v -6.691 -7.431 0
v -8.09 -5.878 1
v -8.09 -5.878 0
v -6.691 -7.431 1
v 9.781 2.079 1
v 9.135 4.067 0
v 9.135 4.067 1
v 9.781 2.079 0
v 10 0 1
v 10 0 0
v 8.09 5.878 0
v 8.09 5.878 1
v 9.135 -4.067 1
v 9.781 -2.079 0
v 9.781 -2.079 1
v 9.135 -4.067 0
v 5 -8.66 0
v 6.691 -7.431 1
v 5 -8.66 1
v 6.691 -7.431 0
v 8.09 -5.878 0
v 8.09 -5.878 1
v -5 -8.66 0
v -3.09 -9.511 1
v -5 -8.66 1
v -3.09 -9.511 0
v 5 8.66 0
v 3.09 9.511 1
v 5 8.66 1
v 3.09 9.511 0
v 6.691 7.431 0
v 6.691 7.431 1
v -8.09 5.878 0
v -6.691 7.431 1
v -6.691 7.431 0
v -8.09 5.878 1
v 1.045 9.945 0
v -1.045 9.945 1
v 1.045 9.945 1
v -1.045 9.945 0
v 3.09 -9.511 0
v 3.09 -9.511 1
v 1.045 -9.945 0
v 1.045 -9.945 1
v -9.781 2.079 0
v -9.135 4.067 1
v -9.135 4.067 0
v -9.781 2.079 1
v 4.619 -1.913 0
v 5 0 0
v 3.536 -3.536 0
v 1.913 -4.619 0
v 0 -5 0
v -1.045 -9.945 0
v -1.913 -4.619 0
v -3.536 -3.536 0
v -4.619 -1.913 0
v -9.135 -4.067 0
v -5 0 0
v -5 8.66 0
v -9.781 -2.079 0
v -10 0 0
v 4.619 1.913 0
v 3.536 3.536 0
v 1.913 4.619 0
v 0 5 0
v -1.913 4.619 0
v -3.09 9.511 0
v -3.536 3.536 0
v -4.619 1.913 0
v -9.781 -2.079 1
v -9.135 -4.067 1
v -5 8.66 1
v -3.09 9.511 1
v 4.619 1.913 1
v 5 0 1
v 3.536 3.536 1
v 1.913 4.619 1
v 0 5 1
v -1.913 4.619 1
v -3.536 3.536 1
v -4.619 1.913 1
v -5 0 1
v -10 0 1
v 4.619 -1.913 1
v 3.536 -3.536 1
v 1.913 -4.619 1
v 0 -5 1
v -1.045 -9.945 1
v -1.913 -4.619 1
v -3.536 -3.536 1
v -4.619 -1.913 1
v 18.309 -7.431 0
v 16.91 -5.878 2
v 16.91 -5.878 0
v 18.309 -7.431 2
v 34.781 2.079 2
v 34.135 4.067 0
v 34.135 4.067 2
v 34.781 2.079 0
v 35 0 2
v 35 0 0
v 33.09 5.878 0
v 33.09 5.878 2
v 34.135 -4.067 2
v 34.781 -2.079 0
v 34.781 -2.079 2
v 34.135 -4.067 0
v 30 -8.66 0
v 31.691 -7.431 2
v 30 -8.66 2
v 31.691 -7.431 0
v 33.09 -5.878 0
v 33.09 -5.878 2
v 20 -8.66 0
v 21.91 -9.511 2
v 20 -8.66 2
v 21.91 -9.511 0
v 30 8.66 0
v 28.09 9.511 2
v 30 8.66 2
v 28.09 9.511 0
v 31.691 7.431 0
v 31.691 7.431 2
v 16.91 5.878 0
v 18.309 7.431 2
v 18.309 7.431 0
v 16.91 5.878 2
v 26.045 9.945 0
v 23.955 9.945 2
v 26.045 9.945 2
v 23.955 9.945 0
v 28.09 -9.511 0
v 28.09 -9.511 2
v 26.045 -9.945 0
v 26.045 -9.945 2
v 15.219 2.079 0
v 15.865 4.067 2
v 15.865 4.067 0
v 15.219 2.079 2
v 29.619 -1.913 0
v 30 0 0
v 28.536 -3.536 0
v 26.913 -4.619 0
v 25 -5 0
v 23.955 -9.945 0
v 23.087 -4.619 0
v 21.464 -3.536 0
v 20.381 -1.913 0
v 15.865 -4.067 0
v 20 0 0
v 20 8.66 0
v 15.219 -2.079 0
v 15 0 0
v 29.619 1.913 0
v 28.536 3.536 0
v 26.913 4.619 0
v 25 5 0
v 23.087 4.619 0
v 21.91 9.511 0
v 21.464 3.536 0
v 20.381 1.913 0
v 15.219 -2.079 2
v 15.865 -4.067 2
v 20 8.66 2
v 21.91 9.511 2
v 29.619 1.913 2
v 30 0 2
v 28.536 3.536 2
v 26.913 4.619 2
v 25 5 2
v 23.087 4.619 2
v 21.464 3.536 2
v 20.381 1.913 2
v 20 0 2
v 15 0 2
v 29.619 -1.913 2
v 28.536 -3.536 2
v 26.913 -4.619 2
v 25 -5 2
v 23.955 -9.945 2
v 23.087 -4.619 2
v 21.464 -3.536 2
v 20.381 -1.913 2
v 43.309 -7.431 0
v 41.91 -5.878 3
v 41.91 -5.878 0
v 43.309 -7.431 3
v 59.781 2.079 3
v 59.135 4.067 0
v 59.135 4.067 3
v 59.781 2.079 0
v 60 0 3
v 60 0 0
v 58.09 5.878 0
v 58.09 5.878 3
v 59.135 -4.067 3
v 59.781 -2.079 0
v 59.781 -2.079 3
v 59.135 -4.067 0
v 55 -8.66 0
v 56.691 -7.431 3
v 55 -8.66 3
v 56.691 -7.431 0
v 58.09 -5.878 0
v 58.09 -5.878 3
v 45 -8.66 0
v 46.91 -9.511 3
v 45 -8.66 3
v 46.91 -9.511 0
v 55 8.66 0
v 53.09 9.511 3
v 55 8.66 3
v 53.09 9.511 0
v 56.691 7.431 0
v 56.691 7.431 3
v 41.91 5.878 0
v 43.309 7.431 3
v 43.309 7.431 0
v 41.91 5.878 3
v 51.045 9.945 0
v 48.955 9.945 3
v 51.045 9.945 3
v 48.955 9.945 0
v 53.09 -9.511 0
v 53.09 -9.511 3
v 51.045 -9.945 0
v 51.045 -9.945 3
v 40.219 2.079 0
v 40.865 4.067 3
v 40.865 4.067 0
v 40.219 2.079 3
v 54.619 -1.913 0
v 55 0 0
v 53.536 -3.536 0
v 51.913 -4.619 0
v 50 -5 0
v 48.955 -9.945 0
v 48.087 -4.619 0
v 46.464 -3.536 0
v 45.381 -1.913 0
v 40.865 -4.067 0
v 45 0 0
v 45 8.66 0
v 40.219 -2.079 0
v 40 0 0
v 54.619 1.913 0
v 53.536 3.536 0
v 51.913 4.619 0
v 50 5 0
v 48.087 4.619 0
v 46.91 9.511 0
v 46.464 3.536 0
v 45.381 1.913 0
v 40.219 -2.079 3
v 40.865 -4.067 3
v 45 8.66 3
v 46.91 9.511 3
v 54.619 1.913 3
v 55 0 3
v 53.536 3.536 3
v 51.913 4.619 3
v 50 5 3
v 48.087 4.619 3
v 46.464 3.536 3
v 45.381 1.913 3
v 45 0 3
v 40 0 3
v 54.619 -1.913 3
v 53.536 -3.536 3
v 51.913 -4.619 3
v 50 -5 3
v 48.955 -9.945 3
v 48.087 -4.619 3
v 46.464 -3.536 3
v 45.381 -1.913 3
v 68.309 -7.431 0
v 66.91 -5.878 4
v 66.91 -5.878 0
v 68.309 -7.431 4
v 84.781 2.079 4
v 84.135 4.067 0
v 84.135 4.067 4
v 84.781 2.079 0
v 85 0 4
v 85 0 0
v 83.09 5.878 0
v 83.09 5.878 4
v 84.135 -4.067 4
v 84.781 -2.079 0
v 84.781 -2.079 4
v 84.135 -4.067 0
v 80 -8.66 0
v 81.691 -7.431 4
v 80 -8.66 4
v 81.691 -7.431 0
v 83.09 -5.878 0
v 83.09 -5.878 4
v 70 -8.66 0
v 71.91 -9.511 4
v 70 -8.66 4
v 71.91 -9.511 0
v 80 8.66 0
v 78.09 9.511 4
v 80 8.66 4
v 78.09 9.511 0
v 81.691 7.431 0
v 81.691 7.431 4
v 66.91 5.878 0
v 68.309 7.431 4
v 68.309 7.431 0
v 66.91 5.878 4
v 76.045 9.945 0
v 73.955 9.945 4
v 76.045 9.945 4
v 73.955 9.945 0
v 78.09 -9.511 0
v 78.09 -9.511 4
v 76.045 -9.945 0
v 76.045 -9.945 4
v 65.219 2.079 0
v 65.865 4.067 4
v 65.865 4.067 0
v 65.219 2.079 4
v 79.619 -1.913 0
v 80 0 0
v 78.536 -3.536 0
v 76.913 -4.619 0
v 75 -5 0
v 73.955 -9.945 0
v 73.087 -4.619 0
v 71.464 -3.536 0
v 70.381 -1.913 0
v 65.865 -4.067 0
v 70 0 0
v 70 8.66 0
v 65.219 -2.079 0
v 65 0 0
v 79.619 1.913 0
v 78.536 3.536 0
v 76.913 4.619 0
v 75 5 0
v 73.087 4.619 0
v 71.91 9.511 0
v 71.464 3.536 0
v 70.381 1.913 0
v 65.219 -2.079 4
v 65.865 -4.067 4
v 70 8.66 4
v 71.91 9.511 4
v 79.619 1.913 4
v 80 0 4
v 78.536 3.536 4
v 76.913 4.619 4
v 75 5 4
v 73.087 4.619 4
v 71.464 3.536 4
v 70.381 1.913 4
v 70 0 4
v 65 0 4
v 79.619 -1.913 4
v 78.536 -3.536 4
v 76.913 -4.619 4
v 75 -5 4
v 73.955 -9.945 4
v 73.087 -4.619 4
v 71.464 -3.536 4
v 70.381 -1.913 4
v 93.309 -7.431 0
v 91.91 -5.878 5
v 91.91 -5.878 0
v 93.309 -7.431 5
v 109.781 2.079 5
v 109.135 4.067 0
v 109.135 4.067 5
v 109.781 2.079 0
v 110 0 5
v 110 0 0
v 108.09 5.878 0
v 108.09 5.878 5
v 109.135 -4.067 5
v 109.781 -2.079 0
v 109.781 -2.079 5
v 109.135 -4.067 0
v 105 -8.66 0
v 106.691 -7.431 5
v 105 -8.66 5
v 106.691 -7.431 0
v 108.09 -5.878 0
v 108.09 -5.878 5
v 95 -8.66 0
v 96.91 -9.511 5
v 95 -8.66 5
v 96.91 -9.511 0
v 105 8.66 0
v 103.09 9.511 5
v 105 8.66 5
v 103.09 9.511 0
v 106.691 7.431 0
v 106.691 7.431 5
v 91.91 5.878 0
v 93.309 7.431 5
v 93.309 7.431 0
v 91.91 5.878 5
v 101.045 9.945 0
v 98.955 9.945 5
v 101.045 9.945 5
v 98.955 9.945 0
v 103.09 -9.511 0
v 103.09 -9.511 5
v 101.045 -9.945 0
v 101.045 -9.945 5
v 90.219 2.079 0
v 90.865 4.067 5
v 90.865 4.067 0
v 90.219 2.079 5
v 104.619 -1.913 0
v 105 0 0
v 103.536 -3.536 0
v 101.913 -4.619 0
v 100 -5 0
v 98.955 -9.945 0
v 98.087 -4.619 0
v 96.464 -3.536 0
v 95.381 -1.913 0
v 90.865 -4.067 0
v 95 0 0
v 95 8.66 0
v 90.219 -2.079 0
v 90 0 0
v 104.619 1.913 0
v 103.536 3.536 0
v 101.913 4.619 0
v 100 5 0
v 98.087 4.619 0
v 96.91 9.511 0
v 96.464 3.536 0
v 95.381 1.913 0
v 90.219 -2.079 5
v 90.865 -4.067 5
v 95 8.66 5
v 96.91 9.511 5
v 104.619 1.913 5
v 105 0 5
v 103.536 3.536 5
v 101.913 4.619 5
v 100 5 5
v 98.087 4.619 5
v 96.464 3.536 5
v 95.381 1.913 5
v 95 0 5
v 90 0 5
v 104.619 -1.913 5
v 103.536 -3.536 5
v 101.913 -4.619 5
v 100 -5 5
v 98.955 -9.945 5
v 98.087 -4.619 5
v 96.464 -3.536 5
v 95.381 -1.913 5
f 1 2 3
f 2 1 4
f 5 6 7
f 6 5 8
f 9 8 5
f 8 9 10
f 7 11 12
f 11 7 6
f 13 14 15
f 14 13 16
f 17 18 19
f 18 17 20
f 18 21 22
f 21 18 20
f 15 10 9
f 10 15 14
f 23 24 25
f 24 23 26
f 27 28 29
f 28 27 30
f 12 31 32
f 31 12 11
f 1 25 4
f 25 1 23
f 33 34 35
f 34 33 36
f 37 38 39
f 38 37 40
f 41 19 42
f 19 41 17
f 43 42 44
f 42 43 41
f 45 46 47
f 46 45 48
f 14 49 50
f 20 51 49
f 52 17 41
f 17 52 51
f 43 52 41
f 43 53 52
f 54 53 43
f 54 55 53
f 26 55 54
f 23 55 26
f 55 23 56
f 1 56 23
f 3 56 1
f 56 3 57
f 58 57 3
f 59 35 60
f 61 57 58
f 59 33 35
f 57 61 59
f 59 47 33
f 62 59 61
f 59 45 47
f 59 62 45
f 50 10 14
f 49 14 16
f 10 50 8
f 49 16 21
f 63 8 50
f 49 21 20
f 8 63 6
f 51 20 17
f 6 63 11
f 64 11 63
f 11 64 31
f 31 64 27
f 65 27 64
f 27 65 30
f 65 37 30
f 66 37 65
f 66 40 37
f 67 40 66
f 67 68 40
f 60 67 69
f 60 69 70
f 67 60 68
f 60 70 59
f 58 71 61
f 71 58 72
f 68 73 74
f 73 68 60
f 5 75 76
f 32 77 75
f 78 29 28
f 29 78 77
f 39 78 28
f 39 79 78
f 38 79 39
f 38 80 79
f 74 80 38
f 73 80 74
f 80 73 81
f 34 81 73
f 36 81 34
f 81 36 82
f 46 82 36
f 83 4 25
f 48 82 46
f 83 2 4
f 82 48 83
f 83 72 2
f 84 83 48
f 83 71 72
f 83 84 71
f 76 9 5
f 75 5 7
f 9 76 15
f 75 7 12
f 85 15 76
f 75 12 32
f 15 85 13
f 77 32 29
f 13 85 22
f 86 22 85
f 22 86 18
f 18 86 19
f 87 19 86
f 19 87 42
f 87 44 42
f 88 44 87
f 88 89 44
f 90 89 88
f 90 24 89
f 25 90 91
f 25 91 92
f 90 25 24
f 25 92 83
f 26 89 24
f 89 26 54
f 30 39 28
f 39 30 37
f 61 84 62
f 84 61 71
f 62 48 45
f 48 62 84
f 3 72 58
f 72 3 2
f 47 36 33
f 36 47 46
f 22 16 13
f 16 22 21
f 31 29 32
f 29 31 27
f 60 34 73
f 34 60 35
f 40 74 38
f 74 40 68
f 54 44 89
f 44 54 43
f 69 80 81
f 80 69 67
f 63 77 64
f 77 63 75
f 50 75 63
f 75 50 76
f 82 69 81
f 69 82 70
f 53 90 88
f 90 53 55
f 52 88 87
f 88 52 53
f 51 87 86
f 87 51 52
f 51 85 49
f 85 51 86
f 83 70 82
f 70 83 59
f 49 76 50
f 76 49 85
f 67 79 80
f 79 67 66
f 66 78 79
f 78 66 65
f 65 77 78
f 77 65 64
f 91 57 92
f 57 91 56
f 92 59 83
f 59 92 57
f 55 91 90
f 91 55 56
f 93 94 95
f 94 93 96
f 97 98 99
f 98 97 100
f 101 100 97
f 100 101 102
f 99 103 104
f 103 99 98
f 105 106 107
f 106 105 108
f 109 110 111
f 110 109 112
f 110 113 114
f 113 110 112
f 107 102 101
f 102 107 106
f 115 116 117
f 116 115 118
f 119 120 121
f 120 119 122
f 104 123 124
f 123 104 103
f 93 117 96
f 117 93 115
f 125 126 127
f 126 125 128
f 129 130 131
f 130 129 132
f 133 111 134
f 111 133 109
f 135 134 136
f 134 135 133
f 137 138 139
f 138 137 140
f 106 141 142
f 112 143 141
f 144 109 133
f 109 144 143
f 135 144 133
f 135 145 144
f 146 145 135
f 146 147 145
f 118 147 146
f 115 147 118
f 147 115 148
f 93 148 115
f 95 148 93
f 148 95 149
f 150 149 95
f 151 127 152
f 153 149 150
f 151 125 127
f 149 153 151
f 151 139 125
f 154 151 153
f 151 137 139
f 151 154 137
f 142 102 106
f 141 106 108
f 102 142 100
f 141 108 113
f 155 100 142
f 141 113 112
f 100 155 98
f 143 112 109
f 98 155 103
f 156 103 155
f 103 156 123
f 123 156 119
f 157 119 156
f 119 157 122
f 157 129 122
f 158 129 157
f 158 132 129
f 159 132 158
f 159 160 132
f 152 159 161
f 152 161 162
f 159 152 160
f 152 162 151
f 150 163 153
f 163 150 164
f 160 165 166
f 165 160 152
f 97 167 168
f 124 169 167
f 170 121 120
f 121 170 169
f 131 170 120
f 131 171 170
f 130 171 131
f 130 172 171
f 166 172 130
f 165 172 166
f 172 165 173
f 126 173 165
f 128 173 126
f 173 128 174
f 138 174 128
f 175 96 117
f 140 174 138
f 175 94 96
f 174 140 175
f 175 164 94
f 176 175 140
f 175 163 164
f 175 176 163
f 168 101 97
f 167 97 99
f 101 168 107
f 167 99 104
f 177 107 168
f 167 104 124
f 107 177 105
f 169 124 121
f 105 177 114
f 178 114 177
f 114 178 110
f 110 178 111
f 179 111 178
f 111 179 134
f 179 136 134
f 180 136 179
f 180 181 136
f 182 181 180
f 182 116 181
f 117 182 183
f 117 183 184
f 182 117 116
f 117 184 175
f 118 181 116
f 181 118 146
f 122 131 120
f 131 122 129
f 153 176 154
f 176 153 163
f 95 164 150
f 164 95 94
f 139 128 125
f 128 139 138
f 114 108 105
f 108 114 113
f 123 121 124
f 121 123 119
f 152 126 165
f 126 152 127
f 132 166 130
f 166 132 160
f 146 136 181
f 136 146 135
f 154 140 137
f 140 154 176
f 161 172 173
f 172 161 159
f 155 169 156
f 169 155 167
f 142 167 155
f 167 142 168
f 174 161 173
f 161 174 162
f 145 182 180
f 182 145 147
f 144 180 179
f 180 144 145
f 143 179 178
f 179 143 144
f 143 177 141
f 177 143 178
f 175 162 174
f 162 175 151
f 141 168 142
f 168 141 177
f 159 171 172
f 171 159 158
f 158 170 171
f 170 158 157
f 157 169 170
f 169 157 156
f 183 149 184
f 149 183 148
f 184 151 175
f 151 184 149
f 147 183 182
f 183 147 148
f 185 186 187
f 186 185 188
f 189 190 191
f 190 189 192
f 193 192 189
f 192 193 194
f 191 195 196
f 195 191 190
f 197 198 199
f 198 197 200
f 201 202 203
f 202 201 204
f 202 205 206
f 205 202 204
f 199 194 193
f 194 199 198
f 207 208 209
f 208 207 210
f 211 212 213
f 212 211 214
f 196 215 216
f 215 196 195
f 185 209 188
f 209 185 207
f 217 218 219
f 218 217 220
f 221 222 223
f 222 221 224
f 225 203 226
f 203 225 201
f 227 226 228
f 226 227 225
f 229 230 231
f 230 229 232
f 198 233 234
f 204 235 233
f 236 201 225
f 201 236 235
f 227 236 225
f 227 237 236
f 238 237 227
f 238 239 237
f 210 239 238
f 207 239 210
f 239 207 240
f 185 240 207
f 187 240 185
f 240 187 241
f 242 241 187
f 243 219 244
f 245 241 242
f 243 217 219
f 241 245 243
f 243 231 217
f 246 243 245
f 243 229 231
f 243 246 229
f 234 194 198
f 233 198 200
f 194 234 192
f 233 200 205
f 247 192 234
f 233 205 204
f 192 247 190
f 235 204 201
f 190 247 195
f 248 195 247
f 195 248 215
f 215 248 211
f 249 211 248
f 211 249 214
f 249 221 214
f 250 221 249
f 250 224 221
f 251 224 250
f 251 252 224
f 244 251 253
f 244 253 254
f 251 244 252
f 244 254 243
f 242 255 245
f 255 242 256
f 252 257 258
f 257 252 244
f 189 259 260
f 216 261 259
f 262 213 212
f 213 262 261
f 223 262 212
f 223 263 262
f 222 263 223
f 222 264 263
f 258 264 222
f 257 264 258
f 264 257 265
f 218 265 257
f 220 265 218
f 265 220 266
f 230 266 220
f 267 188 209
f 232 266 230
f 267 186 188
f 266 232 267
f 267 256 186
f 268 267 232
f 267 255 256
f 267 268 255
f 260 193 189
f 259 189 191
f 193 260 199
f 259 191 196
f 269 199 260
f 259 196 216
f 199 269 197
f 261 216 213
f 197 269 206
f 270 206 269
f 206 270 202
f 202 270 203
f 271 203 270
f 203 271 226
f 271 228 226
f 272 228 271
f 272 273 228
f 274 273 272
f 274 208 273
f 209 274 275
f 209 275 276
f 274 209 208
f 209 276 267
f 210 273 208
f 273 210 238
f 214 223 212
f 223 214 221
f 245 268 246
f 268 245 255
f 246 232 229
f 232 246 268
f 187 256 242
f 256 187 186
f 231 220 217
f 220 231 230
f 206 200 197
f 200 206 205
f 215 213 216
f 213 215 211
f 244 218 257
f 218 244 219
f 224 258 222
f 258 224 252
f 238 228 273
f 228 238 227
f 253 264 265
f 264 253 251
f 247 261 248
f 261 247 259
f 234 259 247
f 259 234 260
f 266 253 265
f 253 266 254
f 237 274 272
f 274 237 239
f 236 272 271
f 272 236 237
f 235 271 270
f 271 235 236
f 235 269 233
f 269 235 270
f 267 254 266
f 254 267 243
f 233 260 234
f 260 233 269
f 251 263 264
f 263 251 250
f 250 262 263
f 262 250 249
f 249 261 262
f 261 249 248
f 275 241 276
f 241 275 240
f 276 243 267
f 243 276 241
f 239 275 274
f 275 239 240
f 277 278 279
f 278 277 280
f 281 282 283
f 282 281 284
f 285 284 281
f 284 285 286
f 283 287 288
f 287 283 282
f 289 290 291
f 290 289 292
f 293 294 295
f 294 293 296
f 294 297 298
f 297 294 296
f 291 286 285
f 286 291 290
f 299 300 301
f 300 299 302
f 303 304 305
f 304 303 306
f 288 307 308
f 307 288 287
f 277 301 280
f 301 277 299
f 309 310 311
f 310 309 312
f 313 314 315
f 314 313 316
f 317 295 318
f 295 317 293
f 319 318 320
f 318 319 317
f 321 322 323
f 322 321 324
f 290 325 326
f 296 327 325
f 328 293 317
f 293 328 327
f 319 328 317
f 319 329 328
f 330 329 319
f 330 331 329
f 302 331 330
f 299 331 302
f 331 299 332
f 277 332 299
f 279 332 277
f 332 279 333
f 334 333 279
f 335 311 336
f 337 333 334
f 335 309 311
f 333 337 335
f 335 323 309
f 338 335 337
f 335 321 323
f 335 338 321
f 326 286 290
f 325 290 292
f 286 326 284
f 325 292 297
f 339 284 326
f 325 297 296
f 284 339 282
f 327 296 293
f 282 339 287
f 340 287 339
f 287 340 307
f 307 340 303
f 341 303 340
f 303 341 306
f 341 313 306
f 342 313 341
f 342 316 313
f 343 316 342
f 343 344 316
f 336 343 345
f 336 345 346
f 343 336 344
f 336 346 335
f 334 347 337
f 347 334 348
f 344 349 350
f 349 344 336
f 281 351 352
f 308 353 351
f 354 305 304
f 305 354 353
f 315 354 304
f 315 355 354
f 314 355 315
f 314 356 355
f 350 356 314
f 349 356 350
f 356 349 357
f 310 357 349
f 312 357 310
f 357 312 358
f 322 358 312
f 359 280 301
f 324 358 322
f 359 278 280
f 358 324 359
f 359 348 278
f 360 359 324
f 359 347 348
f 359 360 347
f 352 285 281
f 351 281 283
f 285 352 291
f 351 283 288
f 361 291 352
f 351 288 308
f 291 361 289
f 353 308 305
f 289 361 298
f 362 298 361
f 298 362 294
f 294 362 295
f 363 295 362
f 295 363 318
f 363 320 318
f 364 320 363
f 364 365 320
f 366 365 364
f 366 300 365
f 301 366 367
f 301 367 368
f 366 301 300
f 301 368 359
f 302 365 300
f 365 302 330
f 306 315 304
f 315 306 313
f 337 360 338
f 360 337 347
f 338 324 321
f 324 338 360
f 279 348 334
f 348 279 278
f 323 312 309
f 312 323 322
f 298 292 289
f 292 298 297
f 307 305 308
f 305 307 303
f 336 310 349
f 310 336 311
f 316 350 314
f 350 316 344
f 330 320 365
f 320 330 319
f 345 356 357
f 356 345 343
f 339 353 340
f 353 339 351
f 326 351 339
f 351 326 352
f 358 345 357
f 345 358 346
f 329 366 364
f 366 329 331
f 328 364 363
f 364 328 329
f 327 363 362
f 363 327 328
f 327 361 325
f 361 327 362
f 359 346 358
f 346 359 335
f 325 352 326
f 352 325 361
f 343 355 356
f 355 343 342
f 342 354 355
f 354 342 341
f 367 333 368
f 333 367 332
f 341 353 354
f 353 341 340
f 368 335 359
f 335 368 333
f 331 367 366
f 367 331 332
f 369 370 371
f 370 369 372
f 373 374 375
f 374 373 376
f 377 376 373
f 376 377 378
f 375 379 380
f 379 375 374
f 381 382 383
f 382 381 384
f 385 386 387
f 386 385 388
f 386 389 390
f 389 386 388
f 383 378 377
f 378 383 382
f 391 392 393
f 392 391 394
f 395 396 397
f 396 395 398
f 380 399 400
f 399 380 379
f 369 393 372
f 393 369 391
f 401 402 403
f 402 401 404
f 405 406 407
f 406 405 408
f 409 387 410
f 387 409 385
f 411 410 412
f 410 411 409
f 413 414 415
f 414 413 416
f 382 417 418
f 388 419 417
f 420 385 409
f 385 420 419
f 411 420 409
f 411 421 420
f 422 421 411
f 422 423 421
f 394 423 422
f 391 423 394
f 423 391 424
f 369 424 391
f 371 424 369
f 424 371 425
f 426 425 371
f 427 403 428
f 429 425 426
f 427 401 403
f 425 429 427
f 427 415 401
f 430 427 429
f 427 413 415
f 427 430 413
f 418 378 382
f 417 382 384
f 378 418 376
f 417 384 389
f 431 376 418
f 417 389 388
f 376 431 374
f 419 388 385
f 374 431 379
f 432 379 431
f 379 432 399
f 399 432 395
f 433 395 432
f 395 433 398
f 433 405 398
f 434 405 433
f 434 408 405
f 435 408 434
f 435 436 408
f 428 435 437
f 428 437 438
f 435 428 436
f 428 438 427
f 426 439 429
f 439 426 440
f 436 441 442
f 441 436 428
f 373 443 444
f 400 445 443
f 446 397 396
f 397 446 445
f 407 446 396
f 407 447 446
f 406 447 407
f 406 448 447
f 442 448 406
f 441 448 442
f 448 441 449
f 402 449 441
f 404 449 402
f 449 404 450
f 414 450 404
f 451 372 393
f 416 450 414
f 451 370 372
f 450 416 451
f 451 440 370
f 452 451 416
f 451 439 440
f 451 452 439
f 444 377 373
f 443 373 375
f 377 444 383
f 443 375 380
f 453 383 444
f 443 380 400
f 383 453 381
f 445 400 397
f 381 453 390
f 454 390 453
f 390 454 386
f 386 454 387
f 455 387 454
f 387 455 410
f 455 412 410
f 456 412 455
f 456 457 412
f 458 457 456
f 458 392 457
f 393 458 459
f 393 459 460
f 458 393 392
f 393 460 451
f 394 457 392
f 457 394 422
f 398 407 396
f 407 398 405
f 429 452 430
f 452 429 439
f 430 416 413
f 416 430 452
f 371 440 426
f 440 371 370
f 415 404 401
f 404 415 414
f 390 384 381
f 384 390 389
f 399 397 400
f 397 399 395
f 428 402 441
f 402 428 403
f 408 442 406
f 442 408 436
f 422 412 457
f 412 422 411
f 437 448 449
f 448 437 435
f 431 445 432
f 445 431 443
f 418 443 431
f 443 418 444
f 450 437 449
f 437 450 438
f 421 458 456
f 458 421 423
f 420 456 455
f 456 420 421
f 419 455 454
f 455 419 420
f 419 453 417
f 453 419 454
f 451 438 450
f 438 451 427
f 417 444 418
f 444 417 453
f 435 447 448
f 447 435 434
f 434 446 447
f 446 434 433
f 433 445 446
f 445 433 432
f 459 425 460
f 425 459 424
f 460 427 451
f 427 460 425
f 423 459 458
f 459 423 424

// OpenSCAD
difference() {
    cylinder(1, 10, 10);
    cylinder(1, 5, 5);
}

translate([25,0,0]) difference() {
    cylinder(2, 10, 10);
    cylinder(2, 5, 5);
}

translate([50,0,0]) difference() {
    cylinder(3, 10, 10);
    cylinder(3, 5, 5);
}

translate([75,0,0]) difference() {
    cylinder(4, 10, 10);
    cylinder(4, 5, 5);
}

translate([100,0,0]) difference() {
    cylinder(5, 10, 10);
    cylinder(5, 5, 5);
}
